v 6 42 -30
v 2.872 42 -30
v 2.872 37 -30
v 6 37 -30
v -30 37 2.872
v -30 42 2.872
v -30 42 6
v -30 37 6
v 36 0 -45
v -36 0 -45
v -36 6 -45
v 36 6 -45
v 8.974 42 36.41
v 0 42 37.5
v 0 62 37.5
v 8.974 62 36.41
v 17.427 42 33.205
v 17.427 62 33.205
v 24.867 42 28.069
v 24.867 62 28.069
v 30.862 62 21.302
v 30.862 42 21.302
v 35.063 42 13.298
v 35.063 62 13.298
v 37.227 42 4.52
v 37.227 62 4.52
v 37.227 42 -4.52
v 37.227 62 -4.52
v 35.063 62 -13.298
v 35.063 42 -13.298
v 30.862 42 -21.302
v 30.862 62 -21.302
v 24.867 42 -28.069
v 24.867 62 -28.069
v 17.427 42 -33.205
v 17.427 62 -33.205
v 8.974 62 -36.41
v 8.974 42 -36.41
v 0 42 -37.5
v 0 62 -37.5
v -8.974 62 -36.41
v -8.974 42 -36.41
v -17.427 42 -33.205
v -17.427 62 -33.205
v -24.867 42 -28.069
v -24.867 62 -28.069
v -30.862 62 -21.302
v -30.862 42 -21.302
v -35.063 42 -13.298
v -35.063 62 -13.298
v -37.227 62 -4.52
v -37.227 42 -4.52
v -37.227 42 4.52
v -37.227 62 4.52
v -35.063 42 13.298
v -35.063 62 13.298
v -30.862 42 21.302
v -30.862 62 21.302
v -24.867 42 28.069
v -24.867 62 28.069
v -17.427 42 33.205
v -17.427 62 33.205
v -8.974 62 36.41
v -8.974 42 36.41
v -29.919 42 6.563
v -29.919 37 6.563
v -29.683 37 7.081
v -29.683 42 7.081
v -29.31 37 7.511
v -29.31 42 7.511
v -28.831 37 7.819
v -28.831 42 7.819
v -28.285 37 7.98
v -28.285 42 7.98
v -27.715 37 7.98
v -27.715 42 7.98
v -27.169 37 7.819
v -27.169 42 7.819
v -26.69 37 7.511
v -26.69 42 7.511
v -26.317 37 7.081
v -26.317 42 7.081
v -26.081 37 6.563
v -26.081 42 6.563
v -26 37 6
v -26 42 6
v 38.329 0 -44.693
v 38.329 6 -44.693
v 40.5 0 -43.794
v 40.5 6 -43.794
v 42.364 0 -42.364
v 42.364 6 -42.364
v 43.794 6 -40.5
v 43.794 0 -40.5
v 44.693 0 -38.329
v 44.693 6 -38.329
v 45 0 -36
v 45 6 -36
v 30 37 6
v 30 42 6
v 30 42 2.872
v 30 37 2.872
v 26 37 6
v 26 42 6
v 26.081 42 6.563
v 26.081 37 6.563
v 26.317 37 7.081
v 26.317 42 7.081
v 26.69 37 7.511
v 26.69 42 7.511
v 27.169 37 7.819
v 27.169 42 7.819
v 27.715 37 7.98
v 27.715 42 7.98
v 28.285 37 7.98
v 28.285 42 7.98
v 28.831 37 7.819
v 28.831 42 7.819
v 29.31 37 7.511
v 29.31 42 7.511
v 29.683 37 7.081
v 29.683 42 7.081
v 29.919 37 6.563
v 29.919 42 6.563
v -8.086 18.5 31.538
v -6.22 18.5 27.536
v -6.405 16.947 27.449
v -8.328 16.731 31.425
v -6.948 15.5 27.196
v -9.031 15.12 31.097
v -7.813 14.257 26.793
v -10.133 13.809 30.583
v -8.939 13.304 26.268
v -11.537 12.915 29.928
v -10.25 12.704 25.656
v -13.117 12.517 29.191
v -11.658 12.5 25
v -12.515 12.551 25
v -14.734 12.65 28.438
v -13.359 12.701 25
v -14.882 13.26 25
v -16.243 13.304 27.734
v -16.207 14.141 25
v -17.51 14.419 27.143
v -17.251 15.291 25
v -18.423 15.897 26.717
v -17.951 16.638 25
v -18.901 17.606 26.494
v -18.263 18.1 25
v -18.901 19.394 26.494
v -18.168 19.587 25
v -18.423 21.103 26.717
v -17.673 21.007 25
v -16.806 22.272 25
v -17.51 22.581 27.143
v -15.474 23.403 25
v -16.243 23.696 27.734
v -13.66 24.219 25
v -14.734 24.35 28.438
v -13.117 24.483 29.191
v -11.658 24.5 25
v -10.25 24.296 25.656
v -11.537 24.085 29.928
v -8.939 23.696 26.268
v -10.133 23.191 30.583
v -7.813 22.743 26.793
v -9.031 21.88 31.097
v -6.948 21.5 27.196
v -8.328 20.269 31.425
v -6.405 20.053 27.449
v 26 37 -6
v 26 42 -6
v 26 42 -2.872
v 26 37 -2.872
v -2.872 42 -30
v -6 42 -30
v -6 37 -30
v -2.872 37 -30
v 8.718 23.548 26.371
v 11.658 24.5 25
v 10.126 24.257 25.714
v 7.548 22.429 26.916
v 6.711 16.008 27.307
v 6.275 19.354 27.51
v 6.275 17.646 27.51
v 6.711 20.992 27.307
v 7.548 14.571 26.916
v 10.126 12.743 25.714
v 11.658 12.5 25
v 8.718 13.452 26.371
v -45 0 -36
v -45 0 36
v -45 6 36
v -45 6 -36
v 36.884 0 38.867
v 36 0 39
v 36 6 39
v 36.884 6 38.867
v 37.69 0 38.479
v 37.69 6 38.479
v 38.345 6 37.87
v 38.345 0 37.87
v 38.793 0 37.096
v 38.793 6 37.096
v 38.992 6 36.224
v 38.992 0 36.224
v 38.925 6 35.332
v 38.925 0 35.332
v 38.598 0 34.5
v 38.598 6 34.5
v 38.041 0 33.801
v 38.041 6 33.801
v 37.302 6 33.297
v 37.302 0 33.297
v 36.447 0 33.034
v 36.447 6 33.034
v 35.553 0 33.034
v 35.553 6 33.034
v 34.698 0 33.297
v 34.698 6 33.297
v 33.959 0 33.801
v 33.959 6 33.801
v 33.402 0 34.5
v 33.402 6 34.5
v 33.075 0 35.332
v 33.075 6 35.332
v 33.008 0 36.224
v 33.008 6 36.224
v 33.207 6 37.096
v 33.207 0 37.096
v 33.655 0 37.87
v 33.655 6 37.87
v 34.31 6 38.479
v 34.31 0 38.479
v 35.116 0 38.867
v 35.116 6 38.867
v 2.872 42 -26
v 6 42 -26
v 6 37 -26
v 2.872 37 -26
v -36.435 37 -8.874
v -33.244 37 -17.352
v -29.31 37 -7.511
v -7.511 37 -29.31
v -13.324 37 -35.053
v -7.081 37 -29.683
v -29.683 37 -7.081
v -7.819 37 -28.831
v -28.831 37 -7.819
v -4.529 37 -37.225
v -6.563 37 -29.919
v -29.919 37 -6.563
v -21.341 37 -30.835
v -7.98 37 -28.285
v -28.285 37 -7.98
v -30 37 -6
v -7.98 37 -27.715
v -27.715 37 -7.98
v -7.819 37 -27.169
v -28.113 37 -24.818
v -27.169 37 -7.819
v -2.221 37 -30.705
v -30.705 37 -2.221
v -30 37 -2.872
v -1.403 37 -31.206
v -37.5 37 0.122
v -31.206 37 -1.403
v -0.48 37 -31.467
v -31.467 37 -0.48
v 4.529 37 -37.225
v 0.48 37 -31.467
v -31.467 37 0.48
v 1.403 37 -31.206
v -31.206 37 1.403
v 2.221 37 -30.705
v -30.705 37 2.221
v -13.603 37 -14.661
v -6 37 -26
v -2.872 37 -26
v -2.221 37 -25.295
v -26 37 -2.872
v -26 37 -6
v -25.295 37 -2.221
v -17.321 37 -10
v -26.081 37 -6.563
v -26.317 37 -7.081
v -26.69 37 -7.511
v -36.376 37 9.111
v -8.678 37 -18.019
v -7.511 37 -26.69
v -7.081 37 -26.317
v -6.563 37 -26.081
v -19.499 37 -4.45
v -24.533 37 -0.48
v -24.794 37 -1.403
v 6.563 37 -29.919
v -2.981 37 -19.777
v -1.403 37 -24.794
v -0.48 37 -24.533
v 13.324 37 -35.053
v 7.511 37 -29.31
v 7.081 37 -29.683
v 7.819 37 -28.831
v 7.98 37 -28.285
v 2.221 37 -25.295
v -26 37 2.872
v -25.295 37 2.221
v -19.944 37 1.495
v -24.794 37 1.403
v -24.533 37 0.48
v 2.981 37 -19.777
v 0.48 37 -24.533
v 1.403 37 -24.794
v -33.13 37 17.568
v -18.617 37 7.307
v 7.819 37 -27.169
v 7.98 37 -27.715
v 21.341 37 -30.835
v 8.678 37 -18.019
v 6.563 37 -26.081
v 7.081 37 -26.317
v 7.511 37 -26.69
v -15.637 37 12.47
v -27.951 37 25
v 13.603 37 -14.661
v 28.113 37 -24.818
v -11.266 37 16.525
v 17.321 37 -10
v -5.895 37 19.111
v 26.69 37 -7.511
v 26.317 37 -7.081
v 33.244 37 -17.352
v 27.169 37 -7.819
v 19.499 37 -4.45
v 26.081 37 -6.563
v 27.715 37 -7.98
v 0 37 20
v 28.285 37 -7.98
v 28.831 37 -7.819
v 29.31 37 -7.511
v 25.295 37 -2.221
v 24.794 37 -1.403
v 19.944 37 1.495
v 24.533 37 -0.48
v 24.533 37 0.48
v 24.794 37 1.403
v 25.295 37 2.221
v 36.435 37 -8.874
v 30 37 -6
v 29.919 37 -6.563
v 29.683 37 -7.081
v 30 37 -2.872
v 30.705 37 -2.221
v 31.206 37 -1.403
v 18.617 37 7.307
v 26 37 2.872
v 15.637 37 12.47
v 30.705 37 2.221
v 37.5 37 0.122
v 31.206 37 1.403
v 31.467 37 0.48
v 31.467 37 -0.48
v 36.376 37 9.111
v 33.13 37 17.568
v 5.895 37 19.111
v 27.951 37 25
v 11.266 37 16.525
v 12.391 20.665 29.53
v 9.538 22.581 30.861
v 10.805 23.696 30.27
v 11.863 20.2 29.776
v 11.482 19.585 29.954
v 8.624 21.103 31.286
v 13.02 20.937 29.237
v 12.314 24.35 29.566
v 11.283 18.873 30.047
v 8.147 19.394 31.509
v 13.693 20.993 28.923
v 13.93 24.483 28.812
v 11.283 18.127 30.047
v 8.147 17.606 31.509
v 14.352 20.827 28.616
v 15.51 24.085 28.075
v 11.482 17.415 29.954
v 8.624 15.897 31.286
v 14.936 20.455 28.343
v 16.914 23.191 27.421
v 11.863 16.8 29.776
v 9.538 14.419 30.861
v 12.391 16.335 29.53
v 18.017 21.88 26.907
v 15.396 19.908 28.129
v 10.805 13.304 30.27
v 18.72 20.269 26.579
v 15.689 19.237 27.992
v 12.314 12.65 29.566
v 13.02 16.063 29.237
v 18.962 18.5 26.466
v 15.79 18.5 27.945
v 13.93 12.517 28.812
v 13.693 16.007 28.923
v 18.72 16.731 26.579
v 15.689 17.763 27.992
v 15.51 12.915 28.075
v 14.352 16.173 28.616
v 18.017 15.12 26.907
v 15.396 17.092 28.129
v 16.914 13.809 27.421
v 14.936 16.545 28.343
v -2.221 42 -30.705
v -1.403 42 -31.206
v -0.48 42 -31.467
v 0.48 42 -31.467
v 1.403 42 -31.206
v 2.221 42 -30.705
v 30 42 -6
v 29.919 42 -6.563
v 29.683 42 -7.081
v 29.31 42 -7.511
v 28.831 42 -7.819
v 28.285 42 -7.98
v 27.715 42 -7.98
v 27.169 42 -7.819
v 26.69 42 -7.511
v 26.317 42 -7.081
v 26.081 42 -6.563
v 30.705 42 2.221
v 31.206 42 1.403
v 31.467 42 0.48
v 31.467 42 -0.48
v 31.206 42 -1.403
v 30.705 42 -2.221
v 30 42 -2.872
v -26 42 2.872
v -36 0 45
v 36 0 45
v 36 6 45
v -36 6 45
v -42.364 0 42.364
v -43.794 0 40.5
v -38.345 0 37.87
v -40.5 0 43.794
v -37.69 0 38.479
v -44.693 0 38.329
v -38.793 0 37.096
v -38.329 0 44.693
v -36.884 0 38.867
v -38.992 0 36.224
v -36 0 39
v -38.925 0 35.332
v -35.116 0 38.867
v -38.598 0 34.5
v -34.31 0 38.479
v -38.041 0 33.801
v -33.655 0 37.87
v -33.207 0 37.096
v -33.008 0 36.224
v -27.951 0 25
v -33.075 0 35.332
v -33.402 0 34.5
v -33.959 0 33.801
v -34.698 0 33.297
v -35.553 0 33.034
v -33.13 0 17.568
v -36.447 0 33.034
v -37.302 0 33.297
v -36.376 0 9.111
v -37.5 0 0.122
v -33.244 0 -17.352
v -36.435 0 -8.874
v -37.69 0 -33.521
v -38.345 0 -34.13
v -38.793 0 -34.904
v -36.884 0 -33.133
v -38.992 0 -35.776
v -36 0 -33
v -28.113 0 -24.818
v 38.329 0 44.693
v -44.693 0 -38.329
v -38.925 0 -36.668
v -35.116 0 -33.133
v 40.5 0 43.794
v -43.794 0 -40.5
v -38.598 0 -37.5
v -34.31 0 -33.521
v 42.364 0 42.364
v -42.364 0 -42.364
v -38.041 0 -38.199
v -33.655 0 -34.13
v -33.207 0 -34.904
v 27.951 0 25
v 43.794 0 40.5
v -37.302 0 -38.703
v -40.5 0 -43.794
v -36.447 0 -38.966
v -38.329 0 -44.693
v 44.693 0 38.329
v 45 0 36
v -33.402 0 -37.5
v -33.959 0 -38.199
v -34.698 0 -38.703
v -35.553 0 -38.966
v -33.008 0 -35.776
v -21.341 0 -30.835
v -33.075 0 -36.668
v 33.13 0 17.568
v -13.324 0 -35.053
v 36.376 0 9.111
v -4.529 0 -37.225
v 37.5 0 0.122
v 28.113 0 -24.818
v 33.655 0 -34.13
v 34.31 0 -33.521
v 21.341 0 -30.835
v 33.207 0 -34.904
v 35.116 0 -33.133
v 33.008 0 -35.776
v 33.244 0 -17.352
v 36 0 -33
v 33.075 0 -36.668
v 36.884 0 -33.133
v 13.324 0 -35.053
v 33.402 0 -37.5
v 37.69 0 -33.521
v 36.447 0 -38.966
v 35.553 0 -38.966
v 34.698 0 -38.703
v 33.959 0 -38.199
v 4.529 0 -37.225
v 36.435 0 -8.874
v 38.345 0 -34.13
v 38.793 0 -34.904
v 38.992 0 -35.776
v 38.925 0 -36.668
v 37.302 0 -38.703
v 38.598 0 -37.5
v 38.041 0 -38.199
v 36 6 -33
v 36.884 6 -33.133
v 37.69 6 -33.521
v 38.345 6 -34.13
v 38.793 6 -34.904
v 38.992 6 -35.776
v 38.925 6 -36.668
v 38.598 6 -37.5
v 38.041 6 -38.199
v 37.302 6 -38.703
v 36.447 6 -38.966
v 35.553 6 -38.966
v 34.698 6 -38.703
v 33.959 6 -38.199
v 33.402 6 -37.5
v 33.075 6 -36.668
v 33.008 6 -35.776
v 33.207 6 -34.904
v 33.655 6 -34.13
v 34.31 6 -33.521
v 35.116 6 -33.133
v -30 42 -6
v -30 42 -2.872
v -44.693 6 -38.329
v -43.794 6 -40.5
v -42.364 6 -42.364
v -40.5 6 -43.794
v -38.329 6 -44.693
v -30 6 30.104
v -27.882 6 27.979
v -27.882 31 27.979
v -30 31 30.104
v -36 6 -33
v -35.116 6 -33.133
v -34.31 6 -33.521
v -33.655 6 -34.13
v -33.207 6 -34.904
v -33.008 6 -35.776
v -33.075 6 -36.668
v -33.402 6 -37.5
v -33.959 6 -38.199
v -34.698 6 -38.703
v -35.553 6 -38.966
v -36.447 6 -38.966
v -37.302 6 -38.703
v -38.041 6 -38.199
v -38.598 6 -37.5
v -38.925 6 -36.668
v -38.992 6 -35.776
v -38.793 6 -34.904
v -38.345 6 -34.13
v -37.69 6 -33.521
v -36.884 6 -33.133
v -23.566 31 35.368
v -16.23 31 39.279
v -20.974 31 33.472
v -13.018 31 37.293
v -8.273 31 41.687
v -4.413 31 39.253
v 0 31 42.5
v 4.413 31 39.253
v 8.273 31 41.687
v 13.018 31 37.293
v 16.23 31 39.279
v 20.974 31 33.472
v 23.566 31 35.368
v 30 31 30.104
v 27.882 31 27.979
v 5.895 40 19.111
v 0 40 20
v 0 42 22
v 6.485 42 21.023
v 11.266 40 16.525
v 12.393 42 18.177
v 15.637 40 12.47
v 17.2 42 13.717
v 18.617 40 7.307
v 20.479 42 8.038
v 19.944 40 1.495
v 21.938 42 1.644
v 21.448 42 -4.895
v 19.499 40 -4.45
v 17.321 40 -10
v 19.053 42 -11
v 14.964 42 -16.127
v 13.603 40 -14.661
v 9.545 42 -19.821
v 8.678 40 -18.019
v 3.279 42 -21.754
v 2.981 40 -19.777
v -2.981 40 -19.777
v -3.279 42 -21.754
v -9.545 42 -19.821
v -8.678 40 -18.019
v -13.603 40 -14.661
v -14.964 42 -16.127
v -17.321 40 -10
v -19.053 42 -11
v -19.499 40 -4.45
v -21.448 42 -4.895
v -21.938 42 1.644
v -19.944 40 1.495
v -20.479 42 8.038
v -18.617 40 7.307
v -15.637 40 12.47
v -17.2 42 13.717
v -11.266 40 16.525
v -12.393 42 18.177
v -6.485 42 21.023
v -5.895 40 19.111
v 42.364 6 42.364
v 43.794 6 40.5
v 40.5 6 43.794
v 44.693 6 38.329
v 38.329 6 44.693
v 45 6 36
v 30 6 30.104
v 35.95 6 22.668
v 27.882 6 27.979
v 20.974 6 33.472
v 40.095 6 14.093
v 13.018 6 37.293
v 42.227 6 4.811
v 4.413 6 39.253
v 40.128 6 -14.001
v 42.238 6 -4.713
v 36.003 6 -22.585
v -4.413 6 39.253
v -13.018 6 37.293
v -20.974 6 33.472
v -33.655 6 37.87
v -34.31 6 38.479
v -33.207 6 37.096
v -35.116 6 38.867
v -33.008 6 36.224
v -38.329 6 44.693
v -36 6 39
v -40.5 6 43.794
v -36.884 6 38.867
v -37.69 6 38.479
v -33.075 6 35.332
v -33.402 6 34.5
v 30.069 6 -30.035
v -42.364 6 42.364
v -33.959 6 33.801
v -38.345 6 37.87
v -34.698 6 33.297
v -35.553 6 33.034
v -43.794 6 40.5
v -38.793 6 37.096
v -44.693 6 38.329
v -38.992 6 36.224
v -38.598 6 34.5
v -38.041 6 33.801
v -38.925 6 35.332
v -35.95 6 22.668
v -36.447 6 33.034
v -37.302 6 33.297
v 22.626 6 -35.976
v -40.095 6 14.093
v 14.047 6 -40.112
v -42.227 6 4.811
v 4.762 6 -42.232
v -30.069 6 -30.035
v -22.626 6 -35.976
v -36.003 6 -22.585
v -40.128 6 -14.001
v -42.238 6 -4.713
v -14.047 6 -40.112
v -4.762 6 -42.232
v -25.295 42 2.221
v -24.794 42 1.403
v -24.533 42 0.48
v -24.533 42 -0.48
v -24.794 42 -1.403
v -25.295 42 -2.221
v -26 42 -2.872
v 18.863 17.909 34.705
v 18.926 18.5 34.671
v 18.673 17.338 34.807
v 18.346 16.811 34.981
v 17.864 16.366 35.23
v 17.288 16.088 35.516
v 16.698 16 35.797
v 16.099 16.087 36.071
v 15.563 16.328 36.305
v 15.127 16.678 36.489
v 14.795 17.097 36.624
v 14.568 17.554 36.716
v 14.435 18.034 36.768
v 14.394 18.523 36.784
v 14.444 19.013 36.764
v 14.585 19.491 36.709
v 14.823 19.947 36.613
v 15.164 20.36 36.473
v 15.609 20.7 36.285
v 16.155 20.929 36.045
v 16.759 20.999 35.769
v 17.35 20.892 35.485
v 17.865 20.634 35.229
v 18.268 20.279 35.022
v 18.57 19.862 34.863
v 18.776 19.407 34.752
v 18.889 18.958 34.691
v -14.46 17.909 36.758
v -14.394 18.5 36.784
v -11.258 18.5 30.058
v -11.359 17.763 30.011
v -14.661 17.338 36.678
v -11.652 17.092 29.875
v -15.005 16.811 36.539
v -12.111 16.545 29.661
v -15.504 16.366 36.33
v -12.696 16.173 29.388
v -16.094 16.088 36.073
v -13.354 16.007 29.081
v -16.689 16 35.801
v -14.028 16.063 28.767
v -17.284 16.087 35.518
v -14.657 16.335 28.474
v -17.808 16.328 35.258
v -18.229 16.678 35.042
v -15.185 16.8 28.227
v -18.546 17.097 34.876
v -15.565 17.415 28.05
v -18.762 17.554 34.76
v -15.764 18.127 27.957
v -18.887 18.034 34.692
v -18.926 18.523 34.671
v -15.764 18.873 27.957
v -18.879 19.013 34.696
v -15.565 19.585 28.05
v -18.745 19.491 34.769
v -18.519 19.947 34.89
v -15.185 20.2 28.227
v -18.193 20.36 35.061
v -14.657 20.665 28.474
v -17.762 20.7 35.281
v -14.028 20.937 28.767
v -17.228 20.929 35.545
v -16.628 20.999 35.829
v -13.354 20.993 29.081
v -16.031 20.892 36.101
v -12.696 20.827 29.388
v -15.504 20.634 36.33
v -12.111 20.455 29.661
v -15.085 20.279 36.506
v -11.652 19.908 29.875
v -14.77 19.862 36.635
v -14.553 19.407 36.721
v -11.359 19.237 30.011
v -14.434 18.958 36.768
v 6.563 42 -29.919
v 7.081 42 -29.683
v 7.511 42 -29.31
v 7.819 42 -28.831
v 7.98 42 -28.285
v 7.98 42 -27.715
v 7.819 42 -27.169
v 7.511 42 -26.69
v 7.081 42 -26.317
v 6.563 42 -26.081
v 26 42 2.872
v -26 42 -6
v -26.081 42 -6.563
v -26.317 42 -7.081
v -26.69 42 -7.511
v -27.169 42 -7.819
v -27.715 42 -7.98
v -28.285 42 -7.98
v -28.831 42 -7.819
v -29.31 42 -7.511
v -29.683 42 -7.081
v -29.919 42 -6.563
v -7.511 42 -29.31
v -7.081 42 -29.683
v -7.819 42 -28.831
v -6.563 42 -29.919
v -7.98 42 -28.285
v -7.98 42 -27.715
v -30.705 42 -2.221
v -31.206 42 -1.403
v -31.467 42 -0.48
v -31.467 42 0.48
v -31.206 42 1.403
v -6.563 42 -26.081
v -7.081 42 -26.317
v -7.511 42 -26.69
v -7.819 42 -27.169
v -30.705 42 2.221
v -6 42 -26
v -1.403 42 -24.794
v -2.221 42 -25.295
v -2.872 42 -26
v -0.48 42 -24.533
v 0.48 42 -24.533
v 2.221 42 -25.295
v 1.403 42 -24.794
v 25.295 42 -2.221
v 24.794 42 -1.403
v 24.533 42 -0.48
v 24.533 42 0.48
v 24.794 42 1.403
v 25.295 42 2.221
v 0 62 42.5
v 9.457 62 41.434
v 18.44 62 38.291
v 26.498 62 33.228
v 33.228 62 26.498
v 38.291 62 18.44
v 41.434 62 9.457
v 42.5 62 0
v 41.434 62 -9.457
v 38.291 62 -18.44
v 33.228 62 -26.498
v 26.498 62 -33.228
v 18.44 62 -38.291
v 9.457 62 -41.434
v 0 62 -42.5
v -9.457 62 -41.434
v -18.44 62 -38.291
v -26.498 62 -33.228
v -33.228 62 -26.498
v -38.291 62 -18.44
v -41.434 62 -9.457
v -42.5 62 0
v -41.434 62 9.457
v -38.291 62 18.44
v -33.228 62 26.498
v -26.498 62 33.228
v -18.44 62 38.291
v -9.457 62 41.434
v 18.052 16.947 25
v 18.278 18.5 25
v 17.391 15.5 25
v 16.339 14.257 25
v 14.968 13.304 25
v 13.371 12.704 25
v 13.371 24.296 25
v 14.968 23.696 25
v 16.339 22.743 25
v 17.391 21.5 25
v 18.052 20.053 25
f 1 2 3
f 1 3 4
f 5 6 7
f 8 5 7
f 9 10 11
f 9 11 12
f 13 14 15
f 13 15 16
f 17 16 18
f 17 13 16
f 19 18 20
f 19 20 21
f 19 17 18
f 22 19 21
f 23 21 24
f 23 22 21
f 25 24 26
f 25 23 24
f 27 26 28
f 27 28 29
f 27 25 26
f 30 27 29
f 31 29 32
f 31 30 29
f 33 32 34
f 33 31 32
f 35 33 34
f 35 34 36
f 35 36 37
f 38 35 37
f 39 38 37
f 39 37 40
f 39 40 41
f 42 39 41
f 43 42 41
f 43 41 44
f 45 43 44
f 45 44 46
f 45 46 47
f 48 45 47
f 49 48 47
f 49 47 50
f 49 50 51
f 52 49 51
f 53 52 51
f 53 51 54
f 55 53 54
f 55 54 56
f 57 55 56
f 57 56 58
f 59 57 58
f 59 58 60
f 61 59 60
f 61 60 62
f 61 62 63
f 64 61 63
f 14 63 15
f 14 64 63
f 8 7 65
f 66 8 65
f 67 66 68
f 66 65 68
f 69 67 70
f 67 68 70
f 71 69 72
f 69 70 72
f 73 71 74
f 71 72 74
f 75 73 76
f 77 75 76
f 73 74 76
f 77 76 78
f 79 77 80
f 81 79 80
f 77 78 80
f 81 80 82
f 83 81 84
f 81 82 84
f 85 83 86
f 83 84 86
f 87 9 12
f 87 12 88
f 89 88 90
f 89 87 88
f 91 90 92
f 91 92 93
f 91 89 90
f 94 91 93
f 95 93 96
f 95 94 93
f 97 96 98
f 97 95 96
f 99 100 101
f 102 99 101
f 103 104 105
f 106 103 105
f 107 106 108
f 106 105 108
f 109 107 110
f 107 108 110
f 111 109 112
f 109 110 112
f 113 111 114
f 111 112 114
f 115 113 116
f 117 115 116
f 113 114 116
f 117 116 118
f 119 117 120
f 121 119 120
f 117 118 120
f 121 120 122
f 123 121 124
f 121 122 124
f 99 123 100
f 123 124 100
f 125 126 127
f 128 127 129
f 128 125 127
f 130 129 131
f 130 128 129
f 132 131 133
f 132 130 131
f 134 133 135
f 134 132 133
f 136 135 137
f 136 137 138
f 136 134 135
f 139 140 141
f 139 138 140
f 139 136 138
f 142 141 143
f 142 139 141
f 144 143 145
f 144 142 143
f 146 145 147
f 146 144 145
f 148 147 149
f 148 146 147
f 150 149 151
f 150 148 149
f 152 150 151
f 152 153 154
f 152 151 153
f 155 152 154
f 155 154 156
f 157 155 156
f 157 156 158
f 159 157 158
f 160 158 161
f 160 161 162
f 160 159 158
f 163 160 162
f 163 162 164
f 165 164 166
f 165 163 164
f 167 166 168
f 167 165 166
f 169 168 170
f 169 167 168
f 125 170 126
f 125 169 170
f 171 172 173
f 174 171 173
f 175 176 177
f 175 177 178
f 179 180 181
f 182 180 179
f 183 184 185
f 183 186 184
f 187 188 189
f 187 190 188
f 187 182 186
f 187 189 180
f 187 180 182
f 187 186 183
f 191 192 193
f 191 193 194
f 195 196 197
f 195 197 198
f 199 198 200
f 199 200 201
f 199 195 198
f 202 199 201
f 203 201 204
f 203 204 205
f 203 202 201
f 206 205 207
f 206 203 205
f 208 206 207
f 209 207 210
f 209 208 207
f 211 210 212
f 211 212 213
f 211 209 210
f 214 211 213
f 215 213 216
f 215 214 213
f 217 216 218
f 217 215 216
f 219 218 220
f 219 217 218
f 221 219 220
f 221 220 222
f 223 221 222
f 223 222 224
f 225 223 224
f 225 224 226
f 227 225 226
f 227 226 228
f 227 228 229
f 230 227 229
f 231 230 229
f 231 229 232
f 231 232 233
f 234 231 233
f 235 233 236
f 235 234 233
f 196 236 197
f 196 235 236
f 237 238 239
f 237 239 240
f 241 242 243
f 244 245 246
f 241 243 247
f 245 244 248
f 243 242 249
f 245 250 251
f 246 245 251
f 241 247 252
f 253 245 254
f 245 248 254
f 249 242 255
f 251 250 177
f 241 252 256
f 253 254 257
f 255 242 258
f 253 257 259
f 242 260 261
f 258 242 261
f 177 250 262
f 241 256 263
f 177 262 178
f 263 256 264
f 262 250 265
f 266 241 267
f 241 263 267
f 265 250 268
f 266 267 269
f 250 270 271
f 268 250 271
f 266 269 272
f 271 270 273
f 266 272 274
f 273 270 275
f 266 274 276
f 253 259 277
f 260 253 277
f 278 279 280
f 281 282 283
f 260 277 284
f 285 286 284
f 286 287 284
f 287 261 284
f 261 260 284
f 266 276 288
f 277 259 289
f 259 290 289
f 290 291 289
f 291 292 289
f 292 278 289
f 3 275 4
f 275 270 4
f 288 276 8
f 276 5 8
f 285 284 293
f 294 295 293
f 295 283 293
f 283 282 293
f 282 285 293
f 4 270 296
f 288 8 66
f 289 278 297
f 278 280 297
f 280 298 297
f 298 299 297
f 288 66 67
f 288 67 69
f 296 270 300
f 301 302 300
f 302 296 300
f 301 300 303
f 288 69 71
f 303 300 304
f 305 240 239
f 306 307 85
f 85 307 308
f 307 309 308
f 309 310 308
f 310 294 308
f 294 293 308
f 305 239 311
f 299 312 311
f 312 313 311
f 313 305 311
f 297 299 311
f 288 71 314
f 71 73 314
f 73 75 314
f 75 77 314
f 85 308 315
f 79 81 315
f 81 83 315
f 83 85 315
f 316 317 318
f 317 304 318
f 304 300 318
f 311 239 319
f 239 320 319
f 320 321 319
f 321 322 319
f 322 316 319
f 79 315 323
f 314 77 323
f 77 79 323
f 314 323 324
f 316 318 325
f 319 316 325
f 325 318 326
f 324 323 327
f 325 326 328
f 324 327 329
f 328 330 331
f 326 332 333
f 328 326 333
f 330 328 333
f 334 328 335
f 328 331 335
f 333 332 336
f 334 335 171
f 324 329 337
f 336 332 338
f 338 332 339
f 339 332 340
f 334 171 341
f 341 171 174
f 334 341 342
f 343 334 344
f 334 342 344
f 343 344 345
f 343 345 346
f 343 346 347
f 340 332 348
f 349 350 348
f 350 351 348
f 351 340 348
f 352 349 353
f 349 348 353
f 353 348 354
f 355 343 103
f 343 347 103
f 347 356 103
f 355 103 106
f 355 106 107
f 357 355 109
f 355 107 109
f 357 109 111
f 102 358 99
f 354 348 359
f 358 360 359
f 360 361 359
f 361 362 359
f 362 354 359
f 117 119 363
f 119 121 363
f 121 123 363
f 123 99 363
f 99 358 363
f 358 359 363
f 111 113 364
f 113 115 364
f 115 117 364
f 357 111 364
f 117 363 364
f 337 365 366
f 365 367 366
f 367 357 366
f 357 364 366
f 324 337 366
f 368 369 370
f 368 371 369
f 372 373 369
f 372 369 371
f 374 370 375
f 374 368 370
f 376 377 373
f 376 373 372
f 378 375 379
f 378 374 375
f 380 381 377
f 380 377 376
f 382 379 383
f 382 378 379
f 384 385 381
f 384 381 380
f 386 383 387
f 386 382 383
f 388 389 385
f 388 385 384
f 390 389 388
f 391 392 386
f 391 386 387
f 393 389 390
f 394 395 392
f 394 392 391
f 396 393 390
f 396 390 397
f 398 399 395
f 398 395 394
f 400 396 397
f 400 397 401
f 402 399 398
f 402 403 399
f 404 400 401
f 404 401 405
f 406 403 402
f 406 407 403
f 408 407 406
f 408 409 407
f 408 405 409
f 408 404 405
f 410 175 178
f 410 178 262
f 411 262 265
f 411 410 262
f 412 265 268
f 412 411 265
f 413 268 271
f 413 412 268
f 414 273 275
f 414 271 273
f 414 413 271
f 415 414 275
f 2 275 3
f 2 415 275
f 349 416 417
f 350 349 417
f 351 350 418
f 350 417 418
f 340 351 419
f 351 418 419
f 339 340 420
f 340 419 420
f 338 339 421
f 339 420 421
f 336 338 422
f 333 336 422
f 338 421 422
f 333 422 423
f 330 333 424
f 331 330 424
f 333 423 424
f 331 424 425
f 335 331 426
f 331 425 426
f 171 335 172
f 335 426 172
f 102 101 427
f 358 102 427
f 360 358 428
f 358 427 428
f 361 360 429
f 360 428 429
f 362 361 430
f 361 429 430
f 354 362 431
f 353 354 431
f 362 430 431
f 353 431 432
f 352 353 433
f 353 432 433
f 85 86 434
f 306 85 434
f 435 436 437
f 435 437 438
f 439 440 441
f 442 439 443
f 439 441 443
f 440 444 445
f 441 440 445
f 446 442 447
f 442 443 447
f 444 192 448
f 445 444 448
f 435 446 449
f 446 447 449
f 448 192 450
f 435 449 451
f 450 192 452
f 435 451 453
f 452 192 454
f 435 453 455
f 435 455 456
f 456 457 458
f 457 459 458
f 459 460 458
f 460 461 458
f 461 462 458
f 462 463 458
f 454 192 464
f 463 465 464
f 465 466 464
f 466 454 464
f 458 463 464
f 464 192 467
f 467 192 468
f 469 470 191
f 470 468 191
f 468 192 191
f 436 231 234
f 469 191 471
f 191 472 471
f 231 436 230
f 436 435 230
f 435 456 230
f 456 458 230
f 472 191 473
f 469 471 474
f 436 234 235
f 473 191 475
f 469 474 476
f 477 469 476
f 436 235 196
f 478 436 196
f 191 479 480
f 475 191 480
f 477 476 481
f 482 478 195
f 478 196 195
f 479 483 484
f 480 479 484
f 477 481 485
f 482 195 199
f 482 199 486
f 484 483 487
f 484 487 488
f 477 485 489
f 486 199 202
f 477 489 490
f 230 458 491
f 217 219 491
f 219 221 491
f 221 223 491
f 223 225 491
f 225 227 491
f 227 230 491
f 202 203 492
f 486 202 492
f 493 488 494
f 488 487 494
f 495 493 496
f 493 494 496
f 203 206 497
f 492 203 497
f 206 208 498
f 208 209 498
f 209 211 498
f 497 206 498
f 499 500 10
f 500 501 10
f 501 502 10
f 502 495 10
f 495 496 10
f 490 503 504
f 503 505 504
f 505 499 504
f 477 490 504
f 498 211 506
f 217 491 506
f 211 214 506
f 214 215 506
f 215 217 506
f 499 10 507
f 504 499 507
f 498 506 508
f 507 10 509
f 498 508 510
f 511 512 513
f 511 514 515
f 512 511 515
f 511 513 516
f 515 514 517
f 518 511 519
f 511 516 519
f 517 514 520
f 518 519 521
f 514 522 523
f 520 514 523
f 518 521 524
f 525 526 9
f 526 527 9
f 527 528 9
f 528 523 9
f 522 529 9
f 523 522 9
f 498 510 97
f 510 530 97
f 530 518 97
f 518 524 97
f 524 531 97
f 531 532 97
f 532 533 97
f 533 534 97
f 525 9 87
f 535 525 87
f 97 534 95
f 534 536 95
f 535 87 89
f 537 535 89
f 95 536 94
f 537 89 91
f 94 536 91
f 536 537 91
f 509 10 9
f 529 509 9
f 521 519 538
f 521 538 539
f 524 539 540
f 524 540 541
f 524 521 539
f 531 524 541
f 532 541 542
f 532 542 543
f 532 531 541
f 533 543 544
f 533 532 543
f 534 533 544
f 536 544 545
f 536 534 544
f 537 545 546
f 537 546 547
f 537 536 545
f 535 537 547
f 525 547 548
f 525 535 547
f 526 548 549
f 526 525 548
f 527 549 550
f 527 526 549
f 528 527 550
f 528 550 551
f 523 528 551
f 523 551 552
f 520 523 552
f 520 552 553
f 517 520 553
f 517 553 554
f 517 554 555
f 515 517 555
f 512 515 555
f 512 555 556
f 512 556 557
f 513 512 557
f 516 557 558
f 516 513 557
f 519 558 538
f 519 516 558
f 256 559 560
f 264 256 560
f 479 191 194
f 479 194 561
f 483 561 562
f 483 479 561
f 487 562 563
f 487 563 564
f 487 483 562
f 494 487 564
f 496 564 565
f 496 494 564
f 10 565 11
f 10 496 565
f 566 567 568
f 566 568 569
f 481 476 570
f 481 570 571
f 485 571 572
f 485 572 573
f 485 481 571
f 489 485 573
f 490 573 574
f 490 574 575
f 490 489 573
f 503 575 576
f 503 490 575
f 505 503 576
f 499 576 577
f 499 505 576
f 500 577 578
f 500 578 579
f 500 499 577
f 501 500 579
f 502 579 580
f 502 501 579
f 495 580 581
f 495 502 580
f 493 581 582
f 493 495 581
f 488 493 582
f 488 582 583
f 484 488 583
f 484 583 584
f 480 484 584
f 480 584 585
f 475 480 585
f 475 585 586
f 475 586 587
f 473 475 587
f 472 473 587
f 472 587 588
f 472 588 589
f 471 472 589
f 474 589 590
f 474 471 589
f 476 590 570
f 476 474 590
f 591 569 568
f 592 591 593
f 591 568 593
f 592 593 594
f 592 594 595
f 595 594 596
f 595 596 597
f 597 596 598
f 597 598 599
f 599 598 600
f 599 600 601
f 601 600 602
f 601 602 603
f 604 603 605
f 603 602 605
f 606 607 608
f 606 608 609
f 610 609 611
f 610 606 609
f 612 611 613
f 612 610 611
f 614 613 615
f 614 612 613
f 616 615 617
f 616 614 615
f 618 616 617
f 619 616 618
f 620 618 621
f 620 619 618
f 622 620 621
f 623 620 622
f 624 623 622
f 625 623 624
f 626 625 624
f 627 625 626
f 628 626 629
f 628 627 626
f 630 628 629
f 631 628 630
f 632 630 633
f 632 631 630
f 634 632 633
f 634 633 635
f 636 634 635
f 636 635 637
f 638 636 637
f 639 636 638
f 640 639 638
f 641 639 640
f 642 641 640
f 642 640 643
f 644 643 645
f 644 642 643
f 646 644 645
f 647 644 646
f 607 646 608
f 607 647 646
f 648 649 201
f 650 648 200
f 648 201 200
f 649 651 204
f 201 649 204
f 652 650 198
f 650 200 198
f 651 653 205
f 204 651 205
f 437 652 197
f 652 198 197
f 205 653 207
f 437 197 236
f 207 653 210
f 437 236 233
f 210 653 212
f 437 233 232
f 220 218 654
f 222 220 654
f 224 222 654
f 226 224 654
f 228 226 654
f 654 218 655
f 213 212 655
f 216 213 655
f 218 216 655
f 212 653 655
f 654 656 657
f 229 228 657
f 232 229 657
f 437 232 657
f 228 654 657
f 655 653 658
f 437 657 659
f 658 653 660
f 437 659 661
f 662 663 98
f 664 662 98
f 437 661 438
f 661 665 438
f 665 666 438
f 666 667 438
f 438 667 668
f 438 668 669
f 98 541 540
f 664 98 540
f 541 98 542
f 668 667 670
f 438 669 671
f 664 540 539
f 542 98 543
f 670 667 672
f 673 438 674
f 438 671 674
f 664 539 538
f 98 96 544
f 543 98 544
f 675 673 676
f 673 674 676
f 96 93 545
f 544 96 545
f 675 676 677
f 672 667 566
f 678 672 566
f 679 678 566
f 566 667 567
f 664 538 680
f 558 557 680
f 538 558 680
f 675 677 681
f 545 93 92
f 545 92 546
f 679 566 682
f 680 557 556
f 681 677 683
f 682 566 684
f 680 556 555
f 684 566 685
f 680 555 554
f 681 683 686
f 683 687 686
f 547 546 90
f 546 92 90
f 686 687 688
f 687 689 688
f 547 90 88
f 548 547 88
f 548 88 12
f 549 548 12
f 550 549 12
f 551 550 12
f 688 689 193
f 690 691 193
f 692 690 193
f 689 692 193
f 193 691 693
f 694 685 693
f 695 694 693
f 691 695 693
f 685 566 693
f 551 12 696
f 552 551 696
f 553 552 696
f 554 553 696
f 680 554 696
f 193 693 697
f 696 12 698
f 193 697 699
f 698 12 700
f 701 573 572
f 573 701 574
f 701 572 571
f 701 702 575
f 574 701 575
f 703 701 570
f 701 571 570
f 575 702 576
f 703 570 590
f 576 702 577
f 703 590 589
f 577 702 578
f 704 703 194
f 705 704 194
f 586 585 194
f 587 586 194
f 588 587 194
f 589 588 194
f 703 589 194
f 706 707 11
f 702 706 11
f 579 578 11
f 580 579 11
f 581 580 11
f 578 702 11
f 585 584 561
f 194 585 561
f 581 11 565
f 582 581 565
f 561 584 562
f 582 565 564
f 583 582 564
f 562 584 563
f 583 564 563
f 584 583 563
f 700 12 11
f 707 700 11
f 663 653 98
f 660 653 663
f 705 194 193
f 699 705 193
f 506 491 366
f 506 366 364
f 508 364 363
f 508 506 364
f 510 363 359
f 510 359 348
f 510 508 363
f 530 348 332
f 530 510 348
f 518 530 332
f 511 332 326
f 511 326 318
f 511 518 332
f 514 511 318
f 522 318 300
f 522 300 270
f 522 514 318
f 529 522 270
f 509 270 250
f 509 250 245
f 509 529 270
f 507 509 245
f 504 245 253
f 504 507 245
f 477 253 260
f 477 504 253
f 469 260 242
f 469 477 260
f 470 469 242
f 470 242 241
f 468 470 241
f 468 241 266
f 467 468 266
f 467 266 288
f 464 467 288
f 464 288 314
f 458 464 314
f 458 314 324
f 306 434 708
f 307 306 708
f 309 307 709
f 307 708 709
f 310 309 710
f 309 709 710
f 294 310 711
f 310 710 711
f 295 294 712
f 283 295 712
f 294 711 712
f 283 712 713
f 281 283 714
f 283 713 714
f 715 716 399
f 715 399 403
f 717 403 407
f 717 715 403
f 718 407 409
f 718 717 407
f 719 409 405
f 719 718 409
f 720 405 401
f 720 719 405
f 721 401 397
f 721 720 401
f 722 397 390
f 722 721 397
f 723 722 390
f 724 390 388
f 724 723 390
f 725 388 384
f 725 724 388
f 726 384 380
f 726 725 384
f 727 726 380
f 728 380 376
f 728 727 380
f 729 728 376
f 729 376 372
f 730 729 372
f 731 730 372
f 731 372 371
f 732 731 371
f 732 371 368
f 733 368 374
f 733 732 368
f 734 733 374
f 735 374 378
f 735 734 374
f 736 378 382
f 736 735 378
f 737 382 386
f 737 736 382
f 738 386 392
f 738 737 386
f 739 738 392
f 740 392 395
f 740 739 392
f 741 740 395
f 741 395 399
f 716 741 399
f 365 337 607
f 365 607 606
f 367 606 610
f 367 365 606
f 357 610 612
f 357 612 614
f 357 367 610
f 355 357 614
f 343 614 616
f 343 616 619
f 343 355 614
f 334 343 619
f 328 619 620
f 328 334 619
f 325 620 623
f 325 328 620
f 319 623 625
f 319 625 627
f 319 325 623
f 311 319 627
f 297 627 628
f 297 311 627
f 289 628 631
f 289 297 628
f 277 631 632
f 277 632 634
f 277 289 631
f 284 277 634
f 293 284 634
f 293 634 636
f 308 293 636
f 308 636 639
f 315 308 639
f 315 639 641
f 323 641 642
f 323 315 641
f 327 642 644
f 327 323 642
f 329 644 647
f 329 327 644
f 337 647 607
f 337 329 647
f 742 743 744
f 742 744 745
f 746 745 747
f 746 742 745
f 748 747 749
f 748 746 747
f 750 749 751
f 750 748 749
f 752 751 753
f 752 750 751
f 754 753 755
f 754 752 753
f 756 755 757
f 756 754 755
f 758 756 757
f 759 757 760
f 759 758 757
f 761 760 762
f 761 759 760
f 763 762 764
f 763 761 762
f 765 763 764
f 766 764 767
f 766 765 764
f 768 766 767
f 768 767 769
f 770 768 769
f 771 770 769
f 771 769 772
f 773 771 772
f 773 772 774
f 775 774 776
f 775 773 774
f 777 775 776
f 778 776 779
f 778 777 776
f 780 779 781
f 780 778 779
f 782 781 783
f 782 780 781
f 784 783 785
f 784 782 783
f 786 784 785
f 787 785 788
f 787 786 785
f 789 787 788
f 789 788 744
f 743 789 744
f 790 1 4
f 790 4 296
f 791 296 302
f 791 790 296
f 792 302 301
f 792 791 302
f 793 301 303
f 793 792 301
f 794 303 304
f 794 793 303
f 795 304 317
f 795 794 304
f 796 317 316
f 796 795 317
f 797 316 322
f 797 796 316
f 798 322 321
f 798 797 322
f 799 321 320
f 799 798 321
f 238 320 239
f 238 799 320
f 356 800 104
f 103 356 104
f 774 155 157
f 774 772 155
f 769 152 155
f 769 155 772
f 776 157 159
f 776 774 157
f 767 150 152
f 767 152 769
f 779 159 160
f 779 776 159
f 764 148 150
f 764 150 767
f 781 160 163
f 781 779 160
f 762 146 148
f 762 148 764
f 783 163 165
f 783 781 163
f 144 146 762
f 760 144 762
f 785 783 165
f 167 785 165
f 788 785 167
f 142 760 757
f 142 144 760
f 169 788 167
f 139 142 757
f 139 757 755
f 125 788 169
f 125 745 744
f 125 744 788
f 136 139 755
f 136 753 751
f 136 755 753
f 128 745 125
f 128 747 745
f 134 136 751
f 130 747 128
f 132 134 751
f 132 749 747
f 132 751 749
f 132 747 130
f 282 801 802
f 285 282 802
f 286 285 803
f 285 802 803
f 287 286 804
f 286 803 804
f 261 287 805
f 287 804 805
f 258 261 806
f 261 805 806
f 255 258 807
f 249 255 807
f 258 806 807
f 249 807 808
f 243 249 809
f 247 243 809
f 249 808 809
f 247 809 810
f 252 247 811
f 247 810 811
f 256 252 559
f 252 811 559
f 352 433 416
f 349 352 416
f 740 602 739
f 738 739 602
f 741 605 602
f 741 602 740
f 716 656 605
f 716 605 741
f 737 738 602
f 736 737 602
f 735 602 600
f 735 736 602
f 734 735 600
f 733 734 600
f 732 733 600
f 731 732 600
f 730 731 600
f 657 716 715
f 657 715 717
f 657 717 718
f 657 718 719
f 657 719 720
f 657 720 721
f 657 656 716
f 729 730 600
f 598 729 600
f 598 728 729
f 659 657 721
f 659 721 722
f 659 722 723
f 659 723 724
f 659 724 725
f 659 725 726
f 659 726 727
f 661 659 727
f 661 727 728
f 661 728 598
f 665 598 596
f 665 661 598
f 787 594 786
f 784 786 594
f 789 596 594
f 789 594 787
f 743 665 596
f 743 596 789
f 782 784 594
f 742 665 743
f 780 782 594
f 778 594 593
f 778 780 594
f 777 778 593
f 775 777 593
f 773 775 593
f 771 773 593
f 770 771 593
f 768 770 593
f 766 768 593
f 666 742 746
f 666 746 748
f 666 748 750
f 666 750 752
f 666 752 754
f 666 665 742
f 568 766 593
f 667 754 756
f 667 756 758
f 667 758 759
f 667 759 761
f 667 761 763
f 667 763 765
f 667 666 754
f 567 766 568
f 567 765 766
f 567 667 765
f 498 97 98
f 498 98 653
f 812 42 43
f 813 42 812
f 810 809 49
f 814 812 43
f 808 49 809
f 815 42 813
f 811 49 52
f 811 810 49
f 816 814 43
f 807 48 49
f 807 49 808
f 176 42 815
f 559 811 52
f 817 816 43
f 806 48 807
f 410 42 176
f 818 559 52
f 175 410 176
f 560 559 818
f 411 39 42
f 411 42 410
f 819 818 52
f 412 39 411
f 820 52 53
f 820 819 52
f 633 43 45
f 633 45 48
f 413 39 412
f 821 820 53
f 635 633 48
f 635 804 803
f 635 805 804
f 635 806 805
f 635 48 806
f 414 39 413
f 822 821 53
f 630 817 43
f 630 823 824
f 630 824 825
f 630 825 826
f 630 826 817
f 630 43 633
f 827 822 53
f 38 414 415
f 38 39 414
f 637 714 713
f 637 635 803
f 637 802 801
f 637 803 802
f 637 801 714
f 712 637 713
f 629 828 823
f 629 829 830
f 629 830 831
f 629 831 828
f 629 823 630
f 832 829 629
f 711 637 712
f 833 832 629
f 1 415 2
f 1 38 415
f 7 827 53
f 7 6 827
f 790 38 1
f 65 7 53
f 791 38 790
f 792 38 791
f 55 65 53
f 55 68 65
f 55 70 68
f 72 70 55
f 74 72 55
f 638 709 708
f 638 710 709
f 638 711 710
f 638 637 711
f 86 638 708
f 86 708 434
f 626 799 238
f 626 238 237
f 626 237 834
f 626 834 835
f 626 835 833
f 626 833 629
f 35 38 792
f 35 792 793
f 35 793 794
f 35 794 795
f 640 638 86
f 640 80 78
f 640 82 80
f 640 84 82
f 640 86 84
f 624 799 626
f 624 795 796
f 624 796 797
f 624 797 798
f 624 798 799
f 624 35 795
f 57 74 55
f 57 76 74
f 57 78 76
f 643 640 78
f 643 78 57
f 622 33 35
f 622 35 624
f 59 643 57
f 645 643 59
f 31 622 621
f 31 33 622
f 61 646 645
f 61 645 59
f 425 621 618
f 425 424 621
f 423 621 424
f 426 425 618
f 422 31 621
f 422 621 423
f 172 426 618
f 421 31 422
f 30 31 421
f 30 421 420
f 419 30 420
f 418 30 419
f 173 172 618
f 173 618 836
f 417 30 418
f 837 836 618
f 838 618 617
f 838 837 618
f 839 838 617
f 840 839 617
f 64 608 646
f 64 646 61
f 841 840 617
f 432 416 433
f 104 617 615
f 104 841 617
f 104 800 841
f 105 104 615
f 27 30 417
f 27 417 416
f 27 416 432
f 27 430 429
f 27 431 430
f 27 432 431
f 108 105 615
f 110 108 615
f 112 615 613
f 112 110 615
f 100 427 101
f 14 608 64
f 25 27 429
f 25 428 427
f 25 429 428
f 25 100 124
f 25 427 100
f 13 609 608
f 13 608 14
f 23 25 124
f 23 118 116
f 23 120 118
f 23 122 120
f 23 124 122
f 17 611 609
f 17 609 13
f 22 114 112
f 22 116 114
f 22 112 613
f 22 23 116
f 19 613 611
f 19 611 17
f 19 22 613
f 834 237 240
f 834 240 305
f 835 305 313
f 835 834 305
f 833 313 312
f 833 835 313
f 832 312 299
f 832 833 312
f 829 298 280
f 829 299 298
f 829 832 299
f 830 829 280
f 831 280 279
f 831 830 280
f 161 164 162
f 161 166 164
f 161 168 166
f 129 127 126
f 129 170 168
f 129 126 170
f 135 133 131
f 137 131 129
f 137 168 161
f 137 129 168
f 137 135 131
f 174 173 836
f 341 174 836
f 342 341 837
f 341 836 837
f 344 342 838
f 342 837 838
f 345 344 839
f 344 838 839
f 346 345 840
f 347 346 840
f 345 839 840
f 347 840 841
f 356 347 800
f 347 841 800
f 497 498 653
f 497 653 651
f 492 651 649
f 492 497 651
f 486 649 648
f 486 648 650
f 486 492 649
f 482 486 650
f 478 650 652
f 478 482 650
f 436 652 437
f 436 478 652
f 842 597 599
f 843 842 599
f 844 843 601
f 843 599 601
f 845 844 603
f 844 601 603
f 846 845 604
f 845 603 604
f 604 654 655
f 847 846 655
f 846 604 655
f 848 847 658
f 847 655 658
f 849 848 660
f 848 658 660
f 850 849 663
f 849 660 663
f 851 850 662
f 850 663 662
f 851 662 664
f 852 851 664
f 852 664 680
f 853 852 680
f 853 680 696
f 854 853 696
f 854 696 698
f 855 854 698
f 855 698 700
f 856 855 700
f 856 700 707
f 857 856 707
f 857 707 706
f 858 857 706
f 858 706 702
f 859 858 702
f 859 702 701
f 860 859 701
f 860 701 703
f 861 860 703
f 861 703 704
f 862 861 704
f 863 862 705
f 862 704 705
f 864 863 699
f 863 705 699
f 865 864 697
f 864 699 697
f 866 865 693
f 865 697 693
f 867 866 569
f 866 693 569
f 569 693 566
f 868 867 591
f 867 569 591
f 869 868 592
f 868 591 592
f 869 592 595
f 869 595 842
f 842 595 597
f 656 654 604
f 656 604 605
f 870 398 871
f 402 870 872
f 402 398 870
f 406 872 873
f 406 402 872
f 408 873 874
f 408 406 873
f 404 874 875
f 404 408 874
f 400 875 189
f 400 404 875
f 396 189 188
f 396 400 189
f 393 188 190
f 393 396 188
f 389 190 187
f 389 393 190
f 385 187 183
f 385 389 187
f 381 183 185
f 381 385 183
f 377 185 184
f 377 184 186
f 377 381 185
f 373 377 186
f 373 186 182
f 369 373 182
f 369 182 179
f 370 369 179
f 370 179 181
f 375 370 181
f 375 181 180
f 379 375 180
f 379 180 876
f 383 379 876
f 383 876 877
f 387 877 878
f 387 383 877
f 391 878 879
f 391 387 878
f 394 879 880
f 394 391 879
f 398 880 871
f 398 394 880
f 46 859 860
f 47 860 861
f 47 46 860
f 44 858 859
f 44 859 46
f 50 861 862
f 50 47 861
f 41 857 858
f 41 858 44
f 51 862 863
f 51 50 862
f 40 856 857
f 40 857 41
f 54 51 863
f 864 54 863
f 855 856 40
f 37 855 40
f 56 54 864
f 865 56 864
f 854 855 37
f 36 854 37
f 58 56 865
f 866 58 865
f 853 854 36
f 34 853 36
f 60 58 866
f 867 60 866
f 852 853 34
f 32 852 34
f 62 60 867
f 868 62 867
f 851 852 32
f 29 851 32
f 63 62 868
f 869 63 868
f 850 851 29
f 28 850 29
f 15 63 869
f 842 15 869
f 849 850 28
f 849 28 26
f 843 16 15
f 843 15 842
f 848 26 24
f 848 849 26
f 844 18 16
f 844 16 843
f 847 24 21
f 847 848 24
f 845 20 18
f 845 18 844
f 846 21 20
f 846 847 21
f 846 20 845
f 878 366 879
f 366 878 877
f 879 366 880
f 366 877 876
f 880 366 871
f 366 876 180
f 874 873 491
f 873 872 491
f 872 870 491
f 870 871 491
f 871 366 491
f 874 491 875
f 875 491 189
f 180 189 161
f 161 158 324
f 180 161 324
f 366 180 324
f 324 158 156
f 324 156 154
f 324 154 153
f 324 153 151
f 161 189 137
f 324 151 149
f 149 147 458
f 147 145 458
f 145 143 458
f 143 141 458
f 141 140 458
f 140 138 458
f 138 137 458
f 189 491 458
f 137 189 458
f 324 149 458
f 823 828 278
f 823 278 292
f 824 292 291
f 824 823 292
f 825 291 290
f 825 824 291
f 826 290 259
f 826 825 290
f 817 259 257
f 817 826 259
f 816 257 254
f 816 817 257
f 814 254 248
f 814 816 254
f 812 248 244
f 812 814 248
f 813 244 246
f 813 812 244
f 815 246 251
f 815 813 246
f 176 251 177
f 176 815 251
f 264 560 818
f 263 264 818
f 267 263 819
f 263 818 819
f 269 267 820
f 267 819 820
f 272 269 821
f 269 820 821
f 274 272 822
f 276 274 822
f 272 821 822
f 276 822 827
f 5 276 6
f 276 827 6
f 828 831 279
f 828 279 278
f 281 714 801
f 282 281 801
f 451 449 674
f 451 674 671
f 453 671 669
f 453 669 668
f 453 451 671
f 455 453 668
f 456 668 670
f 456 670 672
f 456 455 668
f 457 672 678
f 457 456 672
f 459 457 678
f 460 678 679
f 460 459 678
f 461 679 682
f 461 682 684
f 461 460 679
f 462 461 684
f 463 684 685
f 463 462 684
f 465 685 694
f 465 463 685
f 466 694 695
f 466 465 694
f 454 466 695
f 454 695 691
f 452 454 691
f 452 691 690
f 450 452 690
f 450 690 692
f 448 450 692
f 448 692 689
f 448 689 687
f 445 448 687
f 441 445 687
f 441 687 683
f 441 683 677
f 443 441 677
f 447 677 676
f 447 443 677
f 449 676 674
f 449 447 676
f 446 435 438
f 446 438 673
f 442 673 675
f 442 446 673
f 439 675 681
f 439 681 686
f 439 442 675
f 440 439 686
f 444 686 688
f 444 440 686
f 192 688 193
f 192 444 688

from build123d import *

# Parameters (mm, degrees)
SKETCH_1_R          = 42.5
SKETCH_1_R_2        = 3
EXTRUDE_1_DEPTH     = 6
SKETCH_1_3_R        = 42.5
SKETCH_1_3_R_2      = 37.5
EXTRUDE_2_DEPTH     = 62
EXTRUDE_START       = 37
SKETCH_1_5_R        = 37.5
SKETCH_1_5_R_2      = 20
EXTRUDE_3_DEPTH     = 5
CHAMFER_1_SIZE      = 2
EXTRUDE_4_DEPTH     = 37
CUT_EXTRUDE_2_DEPTH = 25
CUT_EXTRUDE_3_REACH = 78.25


with BuildPart() as part:
    # 草图1 → 凸台-拉伸1 (new body)
    with BuildSketch(Plane(origin=(0, 0, 0), x_dir=(1, 0, 0), z_dir=(0, 1, 0))):
        with BuildLine():
            Line((-36, 45), (36, 45))
            ThreePointArc((36, 45), (42.363961031, 42.363961031), (45, 36))
            Line((45, 36), (45, -36))
            ThreePointArc((45, -36), (42.363961031, -42.363961031), (36, -45))
            Line((36, -45), (-36, -45))
            ThreePointArc((-36, -45), (-42.363961031, -42.363961031), (-45, -36))
            Line((-45, -36), (-45, 36))
            ThreePointArc((-45, 36), (-42.363961031, 42.363961031), (-36, 45))
        make_face()
        with Locations(Location((0, 0, 0), (0, 0, 270))):
            Circle(SKETCH_1_R, mode=Mode.SUBTRACT)
        with Locations(Location((-36, 36, 0), (0, 0, 270))):
            Circle(SKETCH_1_R_2, mode=Mode.SUBTRACT)
        with Locations(Location((36, 36, 0), (0, 0, 270))):
            Circle(SKETCH_1_R_2, mode=Mode.SUBTRACT)
        with Locations(Location((36, -36, 0), (0, 0, 270))):
            Circle(SKETCH_1_R_2, mode=Mode.SUBTRACT)
        with Locations(Location((-36, -36, 0), (0, 0, 270))):
            Circle(SKETCH_1_R_2, mode=Mode.SUBTRACT)
    extrude(amount=EXTRUDE_1_DEPTH)

    # 草图1<3> → 凸台-拉伸2 (add)
    with BuildSketch(Plane(origin=(0, 0, 0), x_dir=(1, 0, 0), z_dir=(0, 1, 0))):
        with Locations(Location((0, 0, 0), (0, 0, 270))):
            Circle(SKETCH_1_3_R)
        with Locations(Location((0, 0, 0), (0, 0, 270))):
            Circle(SKETCH_1_3_R_2, mode=Mode.SUBTRACT)
    extrude(amount=EXTRUDE_2_DEPTH)

    # 草图1<5> → 凸台-拉伸3 (add)
    with BuildSketch(Plane(origin=(0, 0, 0), x_dir=(1, 0, 0), z_dir=(0, 1, 0)).offset(EXTRUDE_START)):
        with Locations(Location((0, 0, 0), (0, 0, 270))):
            Circle(SKETCH_1_5_R)
        with Locations(Location((0, 0, 0), (0, 0, 270))):
            Circle(SKETCH_1_5_R_2, mode=Mode.SUBTRACT)
    extrude(amount=EXTRUDE_3_DEPTH)

    # 倒角1
    chamfer_1_edges = [part.edges().sort_by_distance(p)[0] for p in [
        (0, 42, -20),
    ]]
    chamfer(chamfer_1_edges, length=CHAMFER_1_SIZE)

    # 草图1<6> → 凸台-拉伸4 (add)
    with BuildSketch(Plane(origin=(0, 0, 0), x_dir=(1, 0, 0), z_dir=(0, 1, 0))):
        with BuildLine():
            Line((27.950849719, -25), (-27.950849719, -25))
            ThreePointArc((-27.950849719, -25), (0, -37.5), (27.950849719, -25))
        make_face()
    extrude(amount=EXTRUDE_4_DEPTH)

    # 草图2 → 切除-拉伸2 (cut)
    with BuildSketch(Plane(origin=(0, 6, 0), x_dir=(1, 0, 0), z_dir=(0, 1, 0))):
        with BuildLine():
            Line((-27.882352941, -27.978999168), (-30, -30.103986447))
            ThreePointArc((-30, -30.103986447), (0, -42.5), (30, -30.103986447))
            Line((30, -30.103986447), (27.882352941, -27.978999168))
            ThreePointArc((27.882352941, -27.978999168), (0, -39.5), (-27.882352941, -27.978999168))
        make_face()
    extrude(amount=CUT_EXTRUDE_2_DEPTH, mode=Mode.SUBTRACT)

    # 草图3 → 切除-旋转1 (revolve, cut)
    with BuildSketch(Plane(origin=(0, 18.5, 0), x_dir=(1, 0, 0), z_dir=(0, 1, 0))):
        Polygon((11.657691454, -25), (17.095538176, -22.46429043), (18.961631098, -26.466139615), (15.789553843, -27.945303531), (20.195943791, -37.394837269), (17.930174324, -38.451382923), align=None)
    revolve(axis=Axis((17.930174324, 18.5, 38.451382923), (-0.42261826174070033, 0, -0.9063077870366495)), mode=Mode.SUBTRACT)

    # 草图3<4> → 切除-旋转2 (revolve, cut)
    with BuildSketch(Plane(origin=(0, 18.5, 0), x_dir=(1, 0, 0), z_dir=(0, 1, 0)), mode=Mode.PRIVATE) as cut_revolve_2_sk:
        Polygon((-20.195943791, -37.394837269), (-17.930174324, -38.451382923), (-11.657691454, -25), (-17.095538176, -22.46429043), (-18.961631098, -26.466139615), (-15.789553843, -27.945303531), align=None)
    revolve(cut_revolve_2_sk.sketch.rotate(Axis((-17.930174324, 18.5, 38.451382923), (0.42261826174069994, 0, -0.9063077870366497)), 180), axis=Axis((-17.930174324, 18.5, 38.451382923), (0.42261826174069994, 0, -0.9063077870366497)), mode=Mode.SUBTRACT)

    # 草图5 → 切除-拉伸3 (cut, up to next)
    with BuildSketch(Plane(origin=(0, 42, 0), x_dir=(1, 0, 0), z_dir=(0, 1, 0)), mode=Mode.PRIVATE) as cut_extrude_3_sk1:
        with BuildLine():
            Line((-6, 30), (-2.872281323, 30))
            ThreePointArc((-2.872281323, 30), (0, 31.5), (2.872281323, 30))
            Line((2.872281323, 30), (6, 30))
            ThreePointArc((6, 30), (8, 28), (6, 26))
            Line((6, 26), (2.872281323, 26))
            ThreePointArc((2.872281323, 26), (0, 24.5), (-2.872281323, 26))
            Line((-2.872281323, 26), (-6, 26))
            ThreePointArc((-6, 26), (-8, 28), (-6, 30))
        make_face()
    cut_extrude_3_tool1 = extrude(cut_extrude_3_sk1.sketch, amount=-CUT_EXTRUDE_3_REACH, mode=Mode.PRIVATE) & part.part
    # 草图5 → 切除-拉伸3 (cut, up to next)
    with BuildSketch(Plane(origin=(0, 42, 0), x_dir=(1, 0, 0), z_dir=(0, 1, 0)), mode=Mode.PRIVATE) as cut_extrude_3_sk2:
        with BuildLine():
            Line((26, 6), (26, 2.872281323))
            ThreePointArc((26, 2.872281323), (24.5, 0), (26, -2.872281323))
            Line((26, -2.872281323), (26, -6))
            ThreePointArc((26, -6), (28, -8), (30, -6))
            Line((30, -6), (30, -2.872281323))
            ThreePointArc((30, -2.872281323), (31.5, 0), (30, 2.872281323))
            Line((30, 2.872281323), (30, 6))
            ThreePointArc((30, 6), (28, 8), (26, 6))
        make_face()
    cut_extrude_3_tool2 = extrude(cut_extrude_3_sk2.sketch, amount=-CUT_EXTRUDE_3_REACH, mode=Mode.PRIVATE) & part.part
    # 草图5 → 切除-拉伸3 (cut, up to next)
    with BuildSketch(Plane(origin=(0, 42, 0), x_dir=(1, 0, 0), z_dir=(0, 1, 0)), mode=Mode.PRIVATE) as cut_extrude_3_sk3:
        with BuildLine():
            Line((-26, -6), (-26, -2.872281323))
            ThreePointArc((-26, -2.872281323), (-24.5, 0), (-26, 2.872281323))
            Line((-26, 2.872281323), (-26, 6))
            ThreePointArc((-26, 6), (-28, 8), (-30, 6))
            Line((-30, 6), (-30, 2.872281323))
            ThreePointArc((-30, 2.872281323), (-31.5, 0), (-30, -2.872281323))
            Line((-30, -2.872281323), (-30, -6))
            ThreePointArc((-30, -6), (-28, -8), (-26, -6))
        make_face()
    cut_extrude_3_tool3 = extrude(cut_extrude_3_sk3.sketch, amount=-CUT_EXTRUDE_3_REACH, mode=Mode.PRIVATE) & part.part
    add(cut_extrude_3_tool1.solids().sort_by_distance((0, 42, -28))[0], mode=Mode.SUBTRACT)
    add(cut_extrude_3_tool2.solids().sort_by_distance((28, 42, 0))[0], mode=Mode.SUBTRACT)
    add(cut_extrude_3_tool3.solids().sort_by_distance((-28, 42, 0))[0], mode=Mode.SUBTRACT)


solid = part.part
